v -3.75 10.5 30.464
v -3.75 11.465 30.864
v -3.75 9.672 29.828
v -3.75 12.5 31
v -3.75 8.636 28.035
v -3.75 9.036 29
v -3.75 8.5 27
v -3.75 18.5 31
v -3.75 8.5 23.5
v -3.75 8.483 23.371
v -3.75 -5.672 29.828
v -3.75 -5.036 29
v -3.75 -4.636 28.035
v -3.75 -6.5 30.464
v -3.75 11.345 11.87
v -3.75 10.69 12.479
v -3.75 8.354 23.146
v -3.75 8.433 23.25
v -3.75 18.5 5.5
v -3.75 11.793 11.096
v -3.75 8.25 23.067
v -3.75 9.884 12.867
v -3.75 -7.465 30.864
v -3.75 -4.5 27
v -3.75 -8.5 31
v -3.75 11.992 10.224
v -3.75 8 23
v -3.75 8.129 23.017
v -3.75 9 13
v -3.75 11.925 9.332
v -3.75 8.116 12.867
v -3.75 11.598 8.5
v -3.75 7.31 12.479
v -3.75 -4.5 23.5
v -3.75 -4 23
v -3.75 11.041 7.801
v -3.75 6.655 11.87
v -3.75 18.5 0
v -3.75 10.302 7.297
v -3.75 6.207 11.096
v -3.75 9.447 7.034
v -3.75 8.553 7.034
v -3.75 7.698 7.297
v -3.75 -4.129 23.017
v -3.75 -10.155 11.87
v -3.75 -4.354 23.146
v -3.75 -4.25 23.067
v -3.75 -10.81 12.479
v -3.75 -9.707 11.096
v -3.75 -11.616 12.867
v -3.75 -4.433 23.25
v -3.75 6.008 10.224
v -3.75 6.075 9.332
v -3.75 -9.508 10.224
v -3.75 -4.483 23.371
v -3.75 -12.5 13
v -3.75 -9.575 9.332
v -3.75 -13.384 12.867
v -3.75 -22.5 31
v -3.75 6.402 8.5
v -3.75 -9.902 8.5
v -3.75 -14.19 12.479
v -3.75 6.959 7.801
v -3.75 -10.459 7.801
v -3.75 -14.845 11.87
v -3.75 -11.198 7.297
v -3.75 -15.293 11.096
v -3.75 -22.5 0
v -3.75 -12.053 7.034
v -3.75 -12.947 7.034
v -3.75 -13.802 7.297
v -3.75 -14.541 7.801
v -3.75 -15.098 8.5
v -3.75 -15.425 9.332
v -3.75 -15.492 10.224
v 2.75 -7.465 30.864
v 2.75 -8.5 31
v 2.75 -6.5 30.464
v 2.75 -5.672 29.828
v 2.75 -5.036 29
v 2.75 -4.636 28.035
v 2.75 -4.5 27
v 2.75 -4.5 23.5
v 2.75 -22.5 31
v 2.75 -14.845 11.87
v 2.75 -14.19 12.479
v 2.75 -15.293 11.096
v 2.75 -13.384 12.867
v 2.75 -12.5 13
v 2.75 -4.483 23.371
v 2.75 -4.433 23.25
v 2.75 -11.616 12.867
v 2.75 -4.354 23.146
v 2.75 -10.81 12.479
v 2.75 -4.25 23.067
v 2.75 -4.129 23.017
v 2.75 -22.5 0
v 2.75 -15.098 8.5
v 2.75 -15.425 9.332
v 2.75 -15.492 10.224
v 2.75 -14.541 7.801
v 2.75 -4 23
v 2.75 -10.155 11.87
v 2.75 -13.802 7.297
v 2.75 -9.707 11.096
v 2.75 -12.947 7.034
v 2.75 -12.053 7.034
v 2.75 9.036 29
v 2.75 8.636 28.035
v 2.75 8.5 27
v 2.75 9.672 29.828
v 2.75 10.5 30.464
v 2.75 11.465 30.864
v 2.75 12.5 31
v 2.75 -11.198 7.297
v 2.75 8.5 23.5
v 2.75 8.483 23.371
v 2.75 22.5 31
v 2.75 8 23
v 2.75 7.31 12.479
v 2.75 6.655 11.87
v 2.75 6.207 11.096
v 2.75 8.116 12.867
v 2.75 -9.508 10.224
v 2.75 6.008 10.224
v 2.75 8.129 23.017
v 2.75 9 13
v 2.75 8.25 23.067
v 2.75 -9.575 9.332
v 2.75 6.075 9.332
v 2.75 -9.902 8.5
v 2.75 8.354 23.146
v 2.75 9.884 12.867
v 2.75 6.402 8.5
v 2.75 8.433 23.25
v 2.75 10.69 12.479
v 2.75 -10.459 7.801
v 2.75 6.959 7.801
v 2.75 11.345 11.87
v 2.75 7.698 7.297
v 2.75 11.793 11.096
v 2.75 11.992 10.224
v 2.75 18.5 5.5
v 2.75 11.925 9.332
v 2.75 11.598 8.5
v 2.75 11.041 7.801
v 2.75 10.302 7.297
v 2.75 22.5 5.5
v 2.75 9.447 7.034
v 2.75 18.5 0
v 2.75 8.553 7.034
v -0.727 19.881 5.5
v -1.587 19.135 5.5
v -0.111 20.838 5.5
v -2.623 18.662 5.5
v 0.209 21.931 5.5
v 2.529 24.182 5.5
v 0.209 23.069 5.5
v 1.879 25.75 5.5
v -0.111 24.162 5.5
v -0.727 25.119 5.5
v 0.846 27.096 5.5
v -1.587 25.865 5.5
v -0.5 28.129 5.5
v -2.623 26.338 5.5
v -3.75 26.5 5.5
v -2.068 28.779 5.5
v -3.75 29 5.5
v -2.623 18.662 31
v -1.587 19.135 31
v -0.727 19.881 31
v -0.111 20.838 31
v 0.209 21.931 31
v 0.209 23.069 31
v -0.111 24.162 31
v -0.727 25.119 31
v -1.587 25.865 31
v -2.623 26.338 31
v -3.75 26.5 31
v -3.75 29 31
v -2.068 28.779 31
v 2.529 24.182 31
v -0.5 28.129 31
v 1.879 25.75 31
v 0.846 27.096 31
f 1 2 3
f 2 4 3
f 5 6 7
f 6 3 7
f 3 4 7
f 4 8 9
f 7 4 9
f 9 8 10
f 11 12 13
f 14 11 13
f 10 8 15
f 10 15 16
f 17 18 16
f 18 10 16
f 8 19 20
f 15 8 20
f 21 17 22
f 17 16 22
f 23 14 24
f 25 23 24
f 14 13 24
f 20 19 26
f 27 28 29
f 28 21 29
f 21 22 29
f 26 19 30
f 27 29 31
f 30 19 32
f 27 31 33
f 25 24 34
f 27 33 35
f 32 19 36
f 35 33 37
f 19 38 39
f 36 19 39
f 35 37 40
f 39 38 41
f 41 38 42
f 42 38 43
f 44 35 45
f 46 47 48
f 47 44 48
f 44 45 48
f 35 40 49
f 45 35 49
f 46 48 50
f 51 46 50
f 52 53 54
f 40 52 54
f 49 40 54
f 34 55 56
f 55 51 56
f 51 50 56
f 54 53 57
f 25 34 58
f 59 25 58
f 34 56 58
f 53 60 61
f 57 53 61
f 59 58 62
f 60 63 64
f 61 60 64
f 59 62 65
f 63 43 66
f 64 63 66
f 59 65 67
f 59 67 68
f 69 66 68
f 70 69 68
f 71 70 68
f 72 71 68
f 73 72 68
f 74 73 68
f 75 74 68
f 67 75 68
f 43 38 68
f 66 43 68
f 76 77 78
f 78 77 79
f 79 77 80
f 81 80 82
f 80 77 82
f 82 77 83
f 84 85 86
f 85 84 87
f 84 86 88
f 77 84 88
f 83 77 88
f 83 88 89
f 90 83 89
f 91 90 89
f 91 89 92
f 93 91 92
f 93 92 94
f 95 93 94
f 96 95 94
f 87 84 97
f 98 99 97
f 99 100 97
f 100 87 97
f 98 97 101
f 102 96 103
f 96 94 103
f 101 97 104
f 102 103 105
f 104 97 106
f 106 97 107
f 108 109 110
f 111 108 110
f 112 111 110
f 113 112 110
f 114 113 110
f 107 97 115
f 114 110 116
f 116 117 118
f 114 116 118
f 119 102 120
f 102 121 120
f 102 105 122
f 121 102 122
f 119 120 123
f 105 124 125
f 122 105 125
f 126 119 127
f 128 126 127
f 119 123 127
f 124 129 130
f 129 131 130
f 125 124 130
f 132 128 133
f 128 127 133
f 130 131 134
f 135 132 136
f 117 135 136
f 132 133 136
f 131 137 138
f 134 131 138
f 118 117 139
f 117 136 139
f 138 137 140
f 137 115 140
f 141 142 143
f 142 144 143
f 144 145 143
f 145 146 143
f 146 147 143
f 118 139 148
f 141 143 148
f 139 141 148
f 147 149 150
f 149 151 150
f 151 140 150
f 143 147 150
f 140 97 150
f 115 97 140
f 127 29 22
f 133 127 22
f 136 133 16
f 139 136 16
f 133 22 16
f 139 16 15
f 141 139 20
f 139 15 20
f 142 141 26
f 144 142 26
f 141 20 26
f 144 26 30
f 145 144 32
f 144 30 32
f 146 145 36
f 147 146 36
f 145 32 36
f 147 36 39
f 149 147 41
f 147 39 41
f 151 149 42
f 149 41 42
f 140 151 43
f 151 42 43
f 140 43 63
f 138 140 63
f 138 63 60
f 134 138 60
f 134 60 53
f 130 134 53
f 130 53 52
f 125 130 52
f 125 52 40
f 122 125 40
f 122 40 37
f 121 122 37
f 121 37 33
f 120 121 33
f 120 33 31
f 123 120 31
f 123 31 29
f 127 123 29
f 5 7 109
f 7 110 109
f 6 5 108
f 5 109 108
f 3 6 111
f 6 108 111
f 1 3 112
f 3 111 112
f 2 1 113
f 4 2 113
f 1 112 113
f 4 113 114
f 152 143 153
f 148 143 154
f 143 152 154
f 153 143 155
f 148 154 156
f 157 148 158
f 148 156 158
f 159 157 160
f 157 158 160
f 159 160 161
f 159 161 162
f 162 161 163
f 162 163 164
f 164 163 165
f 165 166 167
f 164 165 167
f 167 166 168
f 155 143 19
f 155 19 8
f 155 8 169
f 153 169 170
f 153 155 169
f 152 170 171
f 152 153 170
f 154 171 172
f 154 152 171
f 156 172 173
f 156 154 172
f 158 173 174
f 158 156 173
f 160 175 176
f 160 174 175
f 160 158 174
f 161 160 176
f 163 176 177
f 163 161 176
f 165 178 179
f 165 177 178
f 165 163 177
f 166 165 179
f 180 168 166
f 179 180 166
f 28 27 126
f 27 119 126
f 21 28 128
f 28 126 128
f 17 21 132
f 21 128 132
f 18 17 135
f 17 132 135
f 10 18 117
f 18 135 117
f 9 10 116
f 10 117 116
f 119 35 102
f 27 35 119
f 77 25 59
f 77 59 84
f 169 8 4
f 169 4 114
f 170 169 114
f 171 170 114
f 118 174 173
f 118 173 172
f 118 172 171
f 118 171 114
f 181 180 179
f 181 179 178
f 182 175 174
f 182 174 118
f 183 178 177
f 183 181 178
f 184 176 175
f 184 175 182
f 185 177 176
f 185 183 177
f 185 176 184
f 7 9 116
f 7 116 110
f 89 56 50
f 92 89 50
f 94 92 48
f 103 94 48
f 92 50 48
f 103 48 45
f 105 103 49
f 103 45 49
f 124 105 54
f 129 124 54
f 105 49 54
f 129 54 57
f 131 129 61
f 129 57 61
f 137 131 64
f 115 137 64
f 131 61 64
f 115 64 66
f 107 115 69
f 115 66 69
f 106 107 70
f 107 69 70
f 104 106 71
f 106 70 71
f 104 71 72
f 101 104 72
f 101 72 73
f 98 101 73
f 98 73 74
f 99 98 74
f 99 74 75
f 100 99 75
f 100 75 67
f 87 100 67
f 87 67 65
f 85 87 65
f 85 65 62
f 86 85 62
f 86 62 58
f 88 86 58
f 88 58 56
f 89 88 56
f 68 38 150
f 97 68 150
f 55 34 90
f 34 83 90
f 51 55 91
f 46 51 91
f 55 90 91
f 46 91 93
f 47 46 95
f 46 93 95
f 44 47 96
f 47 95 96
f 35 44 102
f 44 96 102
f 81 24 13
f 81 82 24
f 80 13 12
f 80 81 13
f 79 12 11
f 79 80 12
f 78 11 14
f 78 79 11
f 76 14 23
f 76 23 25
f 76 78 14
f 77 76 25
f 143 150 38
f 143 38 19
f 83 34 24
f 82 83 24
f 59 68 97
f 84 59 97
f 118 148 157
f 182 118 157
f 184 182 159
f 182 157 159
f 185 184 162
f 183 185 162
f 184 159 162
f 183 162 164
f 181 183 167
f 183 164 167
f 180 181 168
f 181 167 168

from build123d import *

# Parameters (mm, degrees)
BOSS_EXTRUDE1_DEPTH = 31
SKETCH2_W           = 5.5
SKETCH2_H           = 10.5
CUT_EXTRUDE1_DEPTH  = 7.5
SKETCH3_R           = 3
CUT_EXTRUDE2_DEPTH  = 7.5
CUT_EXTRUDE4_DEPTH  = 26.5
CUT_EXTRUDE5_REACH  = 8.5
SKETCH6_W           = 8
SKETCH6_H           = 13
FILLET1_R           = 0.5
FILLET2_R           = 4


with BuildPart() as part:
    # Sketch1 → Boss-Extrude1 (new body)
    with BuildSketch(Plane.XY):
        with BuildLine():
            Line((-3.75, 29), (-3.75, 22.5))
            Line((-3.75, 22.5), (-3.75, -22.5))
            Line((-3.75, -22.5), (2.75, -22.5))
            Line((2.75, -22.5), (2.75, 22.5))
            ThreePointArc((2.75, 22.5), (0.846194078, 27.096194078), (-3.75, 29))
        make_face()
    extrude(amount=BOSS_EXTRUDE1_DEPTH)

    # Sketch2 → Cut-Extrude1 (cut, through all)
    with BuildSketch(Plane.ZY.offset(3.75)):
        with Locations((2.75, 23.75)):
            Rectangle(SKETCH2_W, SKETCH2_H)
    extrude(amount=-CUT_EXTRUDE1_DEPTH, mode=Mode.SUBTRACT)

    # Sketch3 → Cut-Extrude2 (cut, through all)
    with BuildSketch(Plane.ZY.offset(3.75)):
        with Locations((10, 9)):
            Circle(SKETCH3_R)
        with Locations((10, -12.5)):
            Circle(SKETCH3_R)
    extrude(amount=-CUT_EXTRUDE2_DEPTH, mode=Mode.SUBTRACT)

    # Sketch4 → Cut-Extrude4 (cut, through all)
    with BuildSketch(Plane(origin=(0, 0, 5.5), x_dir=(-1, 0, 0), z_dir=(0, 0, -1))):
        with BuildLine():
            Line((3.75, 26.5), (3.75, 18.5))
            ThreePointArc((3.75, 18.5), (-0.25, 22.5), (3.75, 26.5))
        make_face()
    extrude(amount=-CUT_EXTRUDE4_DEPTH, mode=Mode.SUBTRACT)

    # Sketch6 → Cut-Extrude5 (cut, up to next)
    with BuildSketch(Plane.ZY.offset(3.75), mode=Mode.PRIVATE) as cut_extrude5_sk1:
        with Locations((27, 2)):
            Rectangle(SKETCH6_W, SKETCH6_H)
    cut_extrude5_tool1 = extrude(cut_extrude5_sk1.sketch, amount=-CUT_EXTRUDE5_REACH, mode=Mode.PRIVATE) & part.part
    add(cut_extrude5_tool1.solids().sort_by_distance((-3.75, 2, 27))[0], mode=Mode.SUBTRACT)

    # Fillet1
    fillet1_edges = [part.edges().sort_by_distance(p)[0] for p in [
        (-0.5, -4.5, 23),
        (-0.5, 8.5, 23),
    ]]
    fillet(fillet1_edges, radius=FILLET1_R)

    # Fillet2
    fillet2_edges = [part.edges().sort_by_distance(p)[0] for p in [
        (-0.5, 8.5, 31),
        (-0.5, -4.5, 31),
    ]]
    fillet(fillet2_edges, radius=FILLET2_R)


solid = part.part
